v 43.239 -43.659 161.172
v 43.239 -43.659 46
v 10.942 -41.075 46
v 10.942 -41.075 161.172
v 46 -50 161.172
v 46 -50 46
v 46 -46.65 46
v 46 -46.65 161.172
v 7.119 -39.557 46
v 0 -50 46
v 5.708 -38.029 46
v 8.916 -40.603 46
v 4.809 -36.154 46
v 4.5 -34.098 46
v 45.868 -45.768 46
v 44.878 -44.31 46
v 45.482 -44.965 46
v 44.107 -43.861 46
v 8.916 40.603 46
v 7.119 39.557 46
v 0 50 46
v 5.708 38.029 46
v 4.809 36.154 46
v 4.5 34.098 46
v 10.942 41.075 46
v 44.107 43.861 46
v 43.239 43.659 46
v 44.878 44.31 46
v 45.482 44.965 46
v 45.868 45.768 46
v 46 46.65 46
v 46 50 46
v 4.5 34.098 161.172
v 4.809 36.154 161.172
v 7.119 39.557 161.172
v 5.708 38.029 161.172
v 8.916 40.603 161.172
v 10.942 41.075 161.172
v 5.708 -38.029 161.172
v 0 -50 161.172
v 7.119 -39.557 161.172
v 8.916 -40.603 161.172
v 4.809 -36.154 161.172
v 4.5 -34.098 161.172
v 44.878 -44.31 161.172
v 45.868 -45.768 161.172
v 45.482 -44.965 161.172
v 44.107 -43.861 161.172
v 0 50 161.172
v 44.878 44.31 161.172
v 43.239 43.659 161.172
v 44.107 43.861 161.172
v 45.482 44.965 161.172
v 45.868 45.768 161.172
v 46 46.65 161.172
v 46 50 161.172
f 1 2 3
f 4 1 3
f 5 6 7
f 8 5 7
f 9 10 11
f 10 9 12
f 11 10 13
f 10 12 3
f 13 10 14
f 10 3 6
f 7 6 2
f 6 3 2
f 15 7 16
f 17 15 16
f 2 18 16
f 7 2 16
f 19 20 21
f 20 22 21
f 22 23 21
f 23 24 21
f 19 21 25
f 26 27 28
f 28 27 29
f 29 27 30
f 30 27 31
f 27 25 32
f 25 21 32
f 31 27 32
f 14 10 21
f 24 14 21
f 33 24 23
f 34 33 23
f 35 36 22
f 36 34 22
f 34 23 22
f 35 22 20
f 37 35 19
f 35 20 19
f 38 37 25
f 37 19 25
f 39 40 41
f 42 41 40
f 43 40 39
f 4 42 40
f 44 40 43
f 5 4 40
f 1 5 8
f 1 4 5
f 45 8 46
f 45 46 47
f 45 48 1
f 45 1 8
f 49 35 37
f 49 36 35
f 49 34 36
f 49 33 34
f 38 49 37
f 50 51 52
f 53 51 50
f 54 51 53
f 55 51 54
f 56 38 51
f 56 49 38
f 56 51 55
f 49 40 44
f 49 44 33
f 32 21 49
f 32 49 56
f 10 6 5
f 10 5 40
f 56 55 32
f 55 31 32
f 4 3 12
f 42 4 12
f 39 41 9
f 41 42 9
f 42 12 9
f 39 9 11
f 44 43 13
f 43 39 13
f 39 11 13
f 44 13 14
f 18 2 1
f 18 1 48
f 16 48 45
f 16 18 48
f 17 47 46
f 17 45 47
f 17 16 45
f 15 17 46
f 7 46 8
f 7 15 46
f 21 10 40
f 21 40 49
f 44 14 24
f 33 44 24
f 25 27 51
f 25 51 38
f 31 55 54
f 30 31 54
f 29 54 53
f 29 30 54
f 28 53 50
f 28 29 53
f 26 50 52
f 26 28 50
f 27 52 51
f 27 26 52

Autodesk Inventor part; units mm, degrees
ref_plane "Начальная плоскость" through (0, 0, 46) normal (0, 0, 1) x (1, 0, 0)
ref_plane "Конечная плоскость" through (0, 0, 161.172) normal (0, 0, 1) x (1, 0, 0)
sketch "Эскиз" plane through (0, 0, 0) normal (0, 0, 1) x (1, 0, 0)
  line L0 (46, -50) -> (0, -50)
  line L1 (46, -50) -> (46, -46.6496)
  line L2 (43.2392, -43.6591) -> (10.9418, -41.0753)
  line L3 (4.5, -34.0976) -> (4.5, 34.0976)
  line L4 (43.2392, 43.6591) -> (10.9418, 41.0753)
  line L5 (46, 46.6496) -> (46, 50)
  line L6 (0, 50) -> (46, 50)
  line L7 (0, -50) -> (0, 50)
  arc A0 (4.5, -34.0976) -> (10.9418, -41.0753) centre (11.5, -34.0976) ccw
  arc A1 (10.9418, 41.0753) -> (4.5, 34.0976) centre (11.5, 34.0976) ccw
  arc A2 (46, -46.6496) -> (43.2392, -43.6591) centre (43, -46.6496) ccw
  arc A3 (43.2392, 43.6591) -> (46, 46.6496) centre (43, 46.6496) ccw
  line L8 (0, 70) -> (0, -70) construction
  line L9 (-9.3169, 0) -> (55.9016, 0) construction
  point P0 (46, -43.88)
  point P1 (4.5, -40.56)
  point P2 (4.5, 40.56)
  point P3 (46, 43.88)
  dimension "d3" = 46
  dimension "d5" = 4.5
  dimension "d7" = 100
  dimension "d9" = 9.44
  dimension "d11" = 9.44
  dimension "d13" = 6.12
  dimension "d15" = 6.12
  dimension "d22" = 7
  dimension "d23" = 3
  dimension "d24" = 50
  dimension "d25" = 0
extrude "Тело" add sketch "Эскиз" along normal up to surface (115.172 mm away) from surface at 46
sketch "Sketch3" plane through (0, 0, 0) normal (0, 0, 1) x (1, 0, 0)
  line L0 (0, 0) -> (10, 0)
ref_plane "Work Plane7" through (0, 0, 0) normal (0, -1, 0) x (1, 0, 0)
sketch "Sketch4" plane through (0, 0, 0) normal (0, -1, 0) x (1, 0, 0)
  line L0 (-2, 46) -> (12, 46)
  line L1 (-2, 161.172) -> (12, 161.172)
  dimension "d29" = 115.172
ref_plane "РабПлоскость8" through (-1308.544, -50, 46) normal (0, 0, -1) x (-1, 0, 0)
split "Разделение1" plane through (-1308.544, -50, 46) removes the side toward (0, 0, -1)
ref_plane "РабПлоскость9" through (46, -50, 161.172) normal (0, 0, 1) x (1, 0, 0)
split "Разделение2" plane through (46, -50, 161.172) removes the side toward (0, 0, 1)
equation "\"d3\" = b"
equation "\"d5\" = t1"
equation "\"d7\" = ParH"
equation "\"d9\" = msp_x1 + t2"
equation "\"d11\" = msp_x1 + t2"
equation "\"d13\" = -msp_x2 + t2"
equation "\"d15\" = -msp_x2 + t2"
equation "\"d22\" = R"
equation "\"d23\" = R1"
equation "\"d24\" = 0.5 * d7"
equation "\"d16\" = G_L"
equation "\"R1\" = 3"
equation "\"R\" = 7"
equation "\"t1\" = 4.5"
equation "\"t2\" = 7.6"
equation "\"ParH\" = 100"
equation "\"b\" = 46"
equation "\"msp_x1\" = 0.04 * b"
equation "\"msp_x2\" = -0.08 * t1 + 0.04 * b"
equation "\"G_L\" = d29"
equation "\"ex\" = 0"
equation "\"G_OFFSET_START\" = -46"
equation "\"G_OFFSET_END\" = -46"
equation "\"d26\" = -G_OFFSET_START"
equation "\"d27\" = G_OFFSET_END + B_L"
equation "\"B_L\" = 207.172"
properties part number "Швеллер 10U-115,17 ГОСТ 8240-97" material "Сталь, мягкая"
